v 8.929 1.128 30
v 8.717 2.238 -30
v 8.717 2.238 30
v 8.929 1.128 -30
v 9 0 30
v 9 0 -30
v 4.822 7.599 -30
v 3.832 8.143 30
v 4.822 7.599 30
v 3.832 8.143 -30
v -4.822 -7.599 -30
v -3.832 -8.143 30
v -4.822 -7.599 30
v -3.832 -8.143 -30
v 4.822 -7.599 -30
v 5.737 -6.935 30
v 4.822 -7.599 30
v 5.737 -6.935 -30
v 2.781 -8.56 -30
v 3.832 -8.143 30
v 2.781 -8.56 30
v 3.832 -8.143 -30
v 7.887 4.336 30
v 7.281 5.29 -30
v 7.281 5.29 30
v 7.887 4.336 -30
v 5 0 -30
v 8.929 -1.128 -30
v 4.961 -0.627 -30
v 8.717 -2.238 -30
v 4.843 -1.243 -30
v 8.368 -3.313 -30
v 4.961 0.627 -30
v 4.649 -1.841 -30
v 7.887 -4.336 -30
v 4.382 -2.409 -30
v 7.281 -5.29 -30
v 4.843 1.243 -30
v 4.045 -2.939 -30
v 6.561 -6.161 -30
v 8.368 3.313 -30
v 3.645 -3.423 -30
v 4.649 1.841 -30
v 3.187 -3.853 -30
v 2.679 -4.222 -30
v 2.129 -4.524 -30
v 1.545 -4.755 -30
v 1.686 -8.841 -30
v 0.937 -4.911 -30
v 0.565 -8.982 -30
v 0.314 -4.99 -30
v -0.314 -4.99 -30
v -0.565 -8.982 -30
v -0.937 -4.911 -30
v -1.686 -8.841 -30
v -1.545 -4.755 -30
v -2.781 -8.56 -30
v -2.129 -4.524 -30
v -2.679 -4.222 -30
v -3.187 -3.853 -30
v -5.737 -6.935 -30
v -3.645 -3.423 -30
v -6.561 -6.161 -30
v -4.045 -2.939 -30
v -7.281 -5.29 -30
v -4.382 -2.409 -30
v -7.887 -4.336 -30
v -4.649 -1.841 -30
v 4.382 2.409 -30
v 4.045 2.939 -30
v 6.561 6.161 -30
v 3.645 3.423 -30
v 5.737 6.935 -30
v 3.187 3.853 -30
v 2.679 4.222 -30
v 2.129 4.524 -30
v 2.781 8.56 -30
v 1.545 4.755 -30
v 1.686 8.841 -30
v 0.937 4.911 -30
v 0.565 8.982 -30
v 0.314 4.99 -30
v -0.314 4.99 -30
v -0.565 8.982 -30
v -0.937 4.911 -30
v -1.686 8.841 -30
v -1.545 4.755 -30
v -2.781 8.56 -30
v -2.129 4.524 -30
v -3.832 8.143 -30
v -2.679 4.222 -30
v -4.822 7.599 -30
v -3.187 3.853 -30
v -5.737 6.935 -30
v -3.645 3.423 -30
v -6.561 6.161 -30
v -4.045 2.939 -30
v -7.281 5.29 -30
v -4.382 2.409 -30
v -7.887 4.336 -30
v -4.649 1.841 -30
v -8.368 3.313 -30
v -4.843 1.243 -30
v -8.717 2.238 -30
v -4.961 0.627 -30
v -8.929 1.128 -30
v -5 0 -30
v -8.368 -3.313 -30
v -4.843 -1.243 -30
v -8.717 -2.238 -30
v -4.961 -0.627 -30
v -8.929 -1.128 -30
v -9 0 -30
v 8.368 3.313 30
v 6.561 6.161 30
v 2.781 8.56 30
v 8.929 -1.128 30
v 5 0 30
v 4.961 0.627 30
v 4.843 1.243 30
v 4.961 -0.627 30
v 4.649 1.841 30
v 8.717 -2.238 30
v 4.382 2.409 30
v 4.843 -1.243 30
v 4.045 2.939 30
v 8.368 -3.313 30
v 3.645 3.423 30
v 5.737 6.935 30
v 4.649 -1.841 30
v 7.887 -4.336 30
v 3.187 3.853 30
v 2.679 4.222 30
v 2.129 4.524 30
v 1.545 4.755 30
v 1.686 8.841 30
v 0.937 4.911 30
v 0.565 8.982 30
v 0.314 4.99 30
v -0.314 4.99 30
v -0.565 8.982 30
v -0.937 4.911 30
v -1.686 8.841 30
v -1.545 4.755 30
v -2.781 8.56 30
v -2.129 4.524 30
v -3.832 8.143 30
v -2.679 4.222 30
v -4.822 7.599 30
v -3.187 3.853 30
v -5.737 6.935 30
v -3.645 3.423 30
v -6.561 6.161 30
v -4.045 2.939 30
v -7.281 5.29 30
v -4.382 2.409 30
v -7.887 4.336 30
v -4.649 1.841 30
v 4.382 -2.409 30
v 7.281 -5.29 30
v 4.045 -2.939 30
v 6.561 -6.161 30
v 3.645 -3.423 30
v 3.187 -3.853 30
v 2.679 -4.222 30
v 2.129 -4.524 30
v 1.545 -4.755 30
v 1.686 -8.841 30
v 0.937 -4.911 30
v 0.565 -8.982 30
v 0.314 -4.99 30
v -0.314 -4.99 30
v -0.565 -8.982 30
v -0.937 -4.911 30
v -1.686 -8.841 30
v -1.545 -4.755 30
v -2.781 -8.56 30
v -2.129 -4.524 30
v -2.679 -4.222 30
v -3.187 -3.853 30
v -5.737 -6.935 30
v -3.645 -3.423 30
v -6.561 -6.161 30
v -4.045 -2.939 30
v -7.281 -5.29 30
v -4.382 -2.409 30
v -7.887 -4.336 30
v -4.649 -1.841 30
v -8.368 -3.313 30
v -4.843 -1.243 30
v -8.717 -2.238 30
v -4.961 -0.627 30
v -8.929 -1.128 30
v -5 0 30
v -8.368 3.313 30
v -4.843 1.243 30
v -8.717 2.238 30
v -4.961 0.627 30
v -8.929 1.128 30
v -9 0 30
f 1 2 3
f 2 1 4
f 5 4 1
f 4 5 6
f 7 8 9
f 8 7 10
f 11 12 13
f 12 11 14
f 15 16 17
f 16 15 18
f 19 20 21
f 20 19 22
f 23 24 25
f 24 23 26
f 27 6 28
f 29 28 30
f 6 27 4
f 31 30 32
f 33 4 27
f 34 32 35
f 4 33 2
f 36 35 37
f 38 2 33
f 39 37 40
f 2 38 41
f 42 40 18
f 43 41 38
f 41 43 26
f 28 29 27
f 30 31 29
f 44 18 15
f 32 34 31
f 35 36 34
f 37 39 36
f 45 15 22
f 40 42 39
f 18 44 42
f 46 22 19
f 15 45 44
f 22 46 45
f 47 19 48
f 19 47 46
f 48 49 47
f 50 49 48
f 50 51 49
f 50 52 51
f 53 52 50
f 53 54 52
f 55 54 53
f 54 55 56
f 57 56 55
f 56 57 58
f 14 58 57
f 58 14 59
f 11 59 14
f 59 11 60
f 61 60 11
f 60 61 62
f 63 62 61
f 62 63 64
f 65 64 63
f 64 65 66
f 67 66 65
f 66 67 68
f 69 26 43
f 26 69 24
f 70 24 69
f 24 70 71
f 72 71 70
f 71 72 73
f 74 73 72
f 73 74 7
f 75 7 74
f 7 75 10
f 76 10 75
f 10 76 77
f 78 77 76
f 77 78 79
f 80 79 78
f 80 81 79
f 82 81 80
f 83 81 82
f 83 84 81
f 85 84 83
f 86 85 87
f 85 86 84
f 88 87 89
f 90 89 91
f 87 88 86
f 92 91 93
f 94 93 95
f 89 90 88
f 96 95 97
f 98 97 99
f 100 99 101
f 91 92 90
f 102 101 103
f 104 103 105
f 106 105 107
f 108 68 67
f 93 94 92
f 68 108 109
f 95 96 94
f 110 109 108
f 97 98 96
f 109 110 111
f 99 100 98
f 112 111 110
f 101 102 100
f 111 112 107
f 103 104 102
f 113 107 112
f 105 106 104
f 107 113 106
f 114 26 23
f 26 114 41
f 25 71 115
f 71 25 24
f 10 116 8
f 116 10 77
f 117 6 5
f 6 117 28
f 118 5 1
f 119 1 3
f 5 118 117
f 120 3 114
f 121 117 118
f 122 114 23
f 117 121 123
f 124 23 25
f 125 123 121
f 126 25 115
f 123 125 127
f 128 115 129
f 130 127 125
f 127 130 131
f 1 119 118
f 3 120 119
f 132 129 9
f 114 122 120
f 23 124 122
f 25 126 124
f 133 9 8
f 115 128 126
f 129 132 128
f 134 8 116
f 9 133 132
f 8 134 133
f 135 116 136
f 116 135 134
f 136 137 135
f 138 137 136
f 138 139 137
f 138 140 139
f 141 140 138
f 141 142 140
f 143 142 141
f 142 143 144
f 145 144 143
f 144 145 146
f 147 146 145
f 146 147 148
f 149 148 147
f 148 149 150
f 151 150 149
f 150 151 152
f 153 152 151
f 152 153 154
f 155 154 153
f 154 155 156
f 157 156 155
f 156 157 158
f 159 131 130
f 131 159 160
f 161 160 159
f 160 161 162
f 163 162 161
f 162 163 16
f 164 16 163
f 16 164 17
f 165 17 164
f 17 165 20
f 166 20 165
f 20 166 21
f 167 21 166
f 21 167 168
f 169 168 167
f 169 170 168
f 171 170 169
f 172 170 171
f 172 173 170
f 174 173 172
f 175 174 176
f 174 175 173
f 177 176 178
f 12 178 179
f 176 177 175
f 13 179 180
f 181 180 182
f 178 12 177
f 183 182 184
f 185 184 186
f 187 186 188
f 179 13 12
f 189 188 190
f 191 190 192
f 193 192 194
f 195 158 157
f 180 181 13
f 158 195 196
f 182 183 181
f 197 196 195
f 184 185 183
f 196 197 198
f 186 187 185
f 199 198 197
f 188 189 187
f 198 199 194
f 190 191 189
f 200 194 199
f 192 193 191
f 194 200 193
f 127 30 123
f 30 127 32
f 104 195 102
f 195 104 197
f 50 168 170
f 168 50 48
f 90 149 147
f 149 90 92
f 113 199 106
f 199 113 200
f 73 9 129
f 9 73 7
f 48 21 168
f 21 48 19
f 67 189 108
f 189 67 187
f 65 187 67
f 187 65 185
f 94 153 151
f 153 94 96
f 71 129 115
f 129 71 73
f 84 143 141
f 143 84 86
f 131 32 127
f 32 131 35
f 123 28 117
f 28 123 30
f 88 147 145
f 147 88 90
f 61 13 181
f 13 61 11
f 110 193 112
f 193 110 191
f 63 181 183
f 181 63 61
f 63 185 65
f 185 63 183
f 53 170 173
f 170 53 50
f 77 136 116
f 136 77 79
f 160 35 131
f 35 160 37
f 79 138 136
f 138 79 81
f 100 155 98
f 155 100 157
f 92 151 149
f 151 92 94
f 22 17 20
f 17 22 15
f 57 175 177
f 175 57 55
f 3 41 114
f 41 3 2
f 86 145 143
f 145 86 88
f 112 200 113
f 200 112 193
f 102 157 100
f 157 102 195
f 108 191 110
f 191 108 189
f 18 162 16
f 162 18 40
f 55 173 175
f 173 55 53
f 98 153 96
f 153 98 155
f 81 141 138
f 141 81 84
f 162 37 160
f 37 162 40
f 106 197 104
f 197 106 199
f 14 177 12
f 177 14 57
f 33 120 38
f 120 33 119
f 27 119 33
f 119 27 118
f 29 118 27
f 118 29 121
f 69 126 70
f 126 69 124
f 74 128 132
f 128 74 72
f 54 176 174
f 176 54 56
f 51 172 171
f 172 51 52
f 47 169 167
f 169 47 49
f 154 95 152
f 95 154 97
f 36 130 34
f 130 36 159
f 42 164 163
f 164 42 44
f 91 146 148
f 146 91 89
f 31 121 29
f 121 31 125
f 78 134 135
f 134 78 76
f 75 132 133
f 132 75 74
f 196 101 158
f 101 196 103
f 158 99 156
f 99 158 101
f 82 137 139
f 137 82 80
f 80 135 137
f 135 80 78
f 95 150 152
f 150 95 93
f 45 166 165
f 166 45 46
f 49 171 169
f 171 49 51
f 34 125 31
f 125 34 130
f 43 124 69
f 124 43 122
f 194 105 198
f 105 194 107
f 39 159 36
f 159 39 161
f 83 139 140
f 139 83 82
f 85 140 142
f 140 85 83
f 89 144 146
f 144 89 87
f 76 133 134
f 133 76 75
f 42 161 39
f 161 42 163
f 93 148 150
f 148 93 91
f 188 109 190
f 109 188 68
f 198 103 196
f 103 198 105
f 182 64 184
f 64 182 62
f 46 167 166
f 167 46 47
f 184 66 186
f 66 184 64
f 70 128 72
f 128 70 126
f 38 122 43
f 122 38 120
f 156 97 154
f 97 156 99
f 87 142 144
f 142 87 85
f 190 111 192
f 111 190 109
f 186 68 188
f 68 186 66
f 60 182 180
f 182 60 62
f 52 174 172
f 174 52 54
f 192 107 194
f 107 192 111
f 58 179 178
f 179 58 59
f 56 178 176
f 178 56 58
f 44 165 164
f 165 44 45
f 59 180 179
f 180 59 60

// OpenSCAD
$fn = 50;


difference() {
	union() {
		translate(v = [0, 0, -30.0000000000]) {
			cylinder(h = 60, r = 9.0000000000);
		}
	}
	union() {
		translate(v = [0, 0, -100.0000000000]) {
			cylinder(h = 200, r = 5.0000000000);
		}
	}
}
